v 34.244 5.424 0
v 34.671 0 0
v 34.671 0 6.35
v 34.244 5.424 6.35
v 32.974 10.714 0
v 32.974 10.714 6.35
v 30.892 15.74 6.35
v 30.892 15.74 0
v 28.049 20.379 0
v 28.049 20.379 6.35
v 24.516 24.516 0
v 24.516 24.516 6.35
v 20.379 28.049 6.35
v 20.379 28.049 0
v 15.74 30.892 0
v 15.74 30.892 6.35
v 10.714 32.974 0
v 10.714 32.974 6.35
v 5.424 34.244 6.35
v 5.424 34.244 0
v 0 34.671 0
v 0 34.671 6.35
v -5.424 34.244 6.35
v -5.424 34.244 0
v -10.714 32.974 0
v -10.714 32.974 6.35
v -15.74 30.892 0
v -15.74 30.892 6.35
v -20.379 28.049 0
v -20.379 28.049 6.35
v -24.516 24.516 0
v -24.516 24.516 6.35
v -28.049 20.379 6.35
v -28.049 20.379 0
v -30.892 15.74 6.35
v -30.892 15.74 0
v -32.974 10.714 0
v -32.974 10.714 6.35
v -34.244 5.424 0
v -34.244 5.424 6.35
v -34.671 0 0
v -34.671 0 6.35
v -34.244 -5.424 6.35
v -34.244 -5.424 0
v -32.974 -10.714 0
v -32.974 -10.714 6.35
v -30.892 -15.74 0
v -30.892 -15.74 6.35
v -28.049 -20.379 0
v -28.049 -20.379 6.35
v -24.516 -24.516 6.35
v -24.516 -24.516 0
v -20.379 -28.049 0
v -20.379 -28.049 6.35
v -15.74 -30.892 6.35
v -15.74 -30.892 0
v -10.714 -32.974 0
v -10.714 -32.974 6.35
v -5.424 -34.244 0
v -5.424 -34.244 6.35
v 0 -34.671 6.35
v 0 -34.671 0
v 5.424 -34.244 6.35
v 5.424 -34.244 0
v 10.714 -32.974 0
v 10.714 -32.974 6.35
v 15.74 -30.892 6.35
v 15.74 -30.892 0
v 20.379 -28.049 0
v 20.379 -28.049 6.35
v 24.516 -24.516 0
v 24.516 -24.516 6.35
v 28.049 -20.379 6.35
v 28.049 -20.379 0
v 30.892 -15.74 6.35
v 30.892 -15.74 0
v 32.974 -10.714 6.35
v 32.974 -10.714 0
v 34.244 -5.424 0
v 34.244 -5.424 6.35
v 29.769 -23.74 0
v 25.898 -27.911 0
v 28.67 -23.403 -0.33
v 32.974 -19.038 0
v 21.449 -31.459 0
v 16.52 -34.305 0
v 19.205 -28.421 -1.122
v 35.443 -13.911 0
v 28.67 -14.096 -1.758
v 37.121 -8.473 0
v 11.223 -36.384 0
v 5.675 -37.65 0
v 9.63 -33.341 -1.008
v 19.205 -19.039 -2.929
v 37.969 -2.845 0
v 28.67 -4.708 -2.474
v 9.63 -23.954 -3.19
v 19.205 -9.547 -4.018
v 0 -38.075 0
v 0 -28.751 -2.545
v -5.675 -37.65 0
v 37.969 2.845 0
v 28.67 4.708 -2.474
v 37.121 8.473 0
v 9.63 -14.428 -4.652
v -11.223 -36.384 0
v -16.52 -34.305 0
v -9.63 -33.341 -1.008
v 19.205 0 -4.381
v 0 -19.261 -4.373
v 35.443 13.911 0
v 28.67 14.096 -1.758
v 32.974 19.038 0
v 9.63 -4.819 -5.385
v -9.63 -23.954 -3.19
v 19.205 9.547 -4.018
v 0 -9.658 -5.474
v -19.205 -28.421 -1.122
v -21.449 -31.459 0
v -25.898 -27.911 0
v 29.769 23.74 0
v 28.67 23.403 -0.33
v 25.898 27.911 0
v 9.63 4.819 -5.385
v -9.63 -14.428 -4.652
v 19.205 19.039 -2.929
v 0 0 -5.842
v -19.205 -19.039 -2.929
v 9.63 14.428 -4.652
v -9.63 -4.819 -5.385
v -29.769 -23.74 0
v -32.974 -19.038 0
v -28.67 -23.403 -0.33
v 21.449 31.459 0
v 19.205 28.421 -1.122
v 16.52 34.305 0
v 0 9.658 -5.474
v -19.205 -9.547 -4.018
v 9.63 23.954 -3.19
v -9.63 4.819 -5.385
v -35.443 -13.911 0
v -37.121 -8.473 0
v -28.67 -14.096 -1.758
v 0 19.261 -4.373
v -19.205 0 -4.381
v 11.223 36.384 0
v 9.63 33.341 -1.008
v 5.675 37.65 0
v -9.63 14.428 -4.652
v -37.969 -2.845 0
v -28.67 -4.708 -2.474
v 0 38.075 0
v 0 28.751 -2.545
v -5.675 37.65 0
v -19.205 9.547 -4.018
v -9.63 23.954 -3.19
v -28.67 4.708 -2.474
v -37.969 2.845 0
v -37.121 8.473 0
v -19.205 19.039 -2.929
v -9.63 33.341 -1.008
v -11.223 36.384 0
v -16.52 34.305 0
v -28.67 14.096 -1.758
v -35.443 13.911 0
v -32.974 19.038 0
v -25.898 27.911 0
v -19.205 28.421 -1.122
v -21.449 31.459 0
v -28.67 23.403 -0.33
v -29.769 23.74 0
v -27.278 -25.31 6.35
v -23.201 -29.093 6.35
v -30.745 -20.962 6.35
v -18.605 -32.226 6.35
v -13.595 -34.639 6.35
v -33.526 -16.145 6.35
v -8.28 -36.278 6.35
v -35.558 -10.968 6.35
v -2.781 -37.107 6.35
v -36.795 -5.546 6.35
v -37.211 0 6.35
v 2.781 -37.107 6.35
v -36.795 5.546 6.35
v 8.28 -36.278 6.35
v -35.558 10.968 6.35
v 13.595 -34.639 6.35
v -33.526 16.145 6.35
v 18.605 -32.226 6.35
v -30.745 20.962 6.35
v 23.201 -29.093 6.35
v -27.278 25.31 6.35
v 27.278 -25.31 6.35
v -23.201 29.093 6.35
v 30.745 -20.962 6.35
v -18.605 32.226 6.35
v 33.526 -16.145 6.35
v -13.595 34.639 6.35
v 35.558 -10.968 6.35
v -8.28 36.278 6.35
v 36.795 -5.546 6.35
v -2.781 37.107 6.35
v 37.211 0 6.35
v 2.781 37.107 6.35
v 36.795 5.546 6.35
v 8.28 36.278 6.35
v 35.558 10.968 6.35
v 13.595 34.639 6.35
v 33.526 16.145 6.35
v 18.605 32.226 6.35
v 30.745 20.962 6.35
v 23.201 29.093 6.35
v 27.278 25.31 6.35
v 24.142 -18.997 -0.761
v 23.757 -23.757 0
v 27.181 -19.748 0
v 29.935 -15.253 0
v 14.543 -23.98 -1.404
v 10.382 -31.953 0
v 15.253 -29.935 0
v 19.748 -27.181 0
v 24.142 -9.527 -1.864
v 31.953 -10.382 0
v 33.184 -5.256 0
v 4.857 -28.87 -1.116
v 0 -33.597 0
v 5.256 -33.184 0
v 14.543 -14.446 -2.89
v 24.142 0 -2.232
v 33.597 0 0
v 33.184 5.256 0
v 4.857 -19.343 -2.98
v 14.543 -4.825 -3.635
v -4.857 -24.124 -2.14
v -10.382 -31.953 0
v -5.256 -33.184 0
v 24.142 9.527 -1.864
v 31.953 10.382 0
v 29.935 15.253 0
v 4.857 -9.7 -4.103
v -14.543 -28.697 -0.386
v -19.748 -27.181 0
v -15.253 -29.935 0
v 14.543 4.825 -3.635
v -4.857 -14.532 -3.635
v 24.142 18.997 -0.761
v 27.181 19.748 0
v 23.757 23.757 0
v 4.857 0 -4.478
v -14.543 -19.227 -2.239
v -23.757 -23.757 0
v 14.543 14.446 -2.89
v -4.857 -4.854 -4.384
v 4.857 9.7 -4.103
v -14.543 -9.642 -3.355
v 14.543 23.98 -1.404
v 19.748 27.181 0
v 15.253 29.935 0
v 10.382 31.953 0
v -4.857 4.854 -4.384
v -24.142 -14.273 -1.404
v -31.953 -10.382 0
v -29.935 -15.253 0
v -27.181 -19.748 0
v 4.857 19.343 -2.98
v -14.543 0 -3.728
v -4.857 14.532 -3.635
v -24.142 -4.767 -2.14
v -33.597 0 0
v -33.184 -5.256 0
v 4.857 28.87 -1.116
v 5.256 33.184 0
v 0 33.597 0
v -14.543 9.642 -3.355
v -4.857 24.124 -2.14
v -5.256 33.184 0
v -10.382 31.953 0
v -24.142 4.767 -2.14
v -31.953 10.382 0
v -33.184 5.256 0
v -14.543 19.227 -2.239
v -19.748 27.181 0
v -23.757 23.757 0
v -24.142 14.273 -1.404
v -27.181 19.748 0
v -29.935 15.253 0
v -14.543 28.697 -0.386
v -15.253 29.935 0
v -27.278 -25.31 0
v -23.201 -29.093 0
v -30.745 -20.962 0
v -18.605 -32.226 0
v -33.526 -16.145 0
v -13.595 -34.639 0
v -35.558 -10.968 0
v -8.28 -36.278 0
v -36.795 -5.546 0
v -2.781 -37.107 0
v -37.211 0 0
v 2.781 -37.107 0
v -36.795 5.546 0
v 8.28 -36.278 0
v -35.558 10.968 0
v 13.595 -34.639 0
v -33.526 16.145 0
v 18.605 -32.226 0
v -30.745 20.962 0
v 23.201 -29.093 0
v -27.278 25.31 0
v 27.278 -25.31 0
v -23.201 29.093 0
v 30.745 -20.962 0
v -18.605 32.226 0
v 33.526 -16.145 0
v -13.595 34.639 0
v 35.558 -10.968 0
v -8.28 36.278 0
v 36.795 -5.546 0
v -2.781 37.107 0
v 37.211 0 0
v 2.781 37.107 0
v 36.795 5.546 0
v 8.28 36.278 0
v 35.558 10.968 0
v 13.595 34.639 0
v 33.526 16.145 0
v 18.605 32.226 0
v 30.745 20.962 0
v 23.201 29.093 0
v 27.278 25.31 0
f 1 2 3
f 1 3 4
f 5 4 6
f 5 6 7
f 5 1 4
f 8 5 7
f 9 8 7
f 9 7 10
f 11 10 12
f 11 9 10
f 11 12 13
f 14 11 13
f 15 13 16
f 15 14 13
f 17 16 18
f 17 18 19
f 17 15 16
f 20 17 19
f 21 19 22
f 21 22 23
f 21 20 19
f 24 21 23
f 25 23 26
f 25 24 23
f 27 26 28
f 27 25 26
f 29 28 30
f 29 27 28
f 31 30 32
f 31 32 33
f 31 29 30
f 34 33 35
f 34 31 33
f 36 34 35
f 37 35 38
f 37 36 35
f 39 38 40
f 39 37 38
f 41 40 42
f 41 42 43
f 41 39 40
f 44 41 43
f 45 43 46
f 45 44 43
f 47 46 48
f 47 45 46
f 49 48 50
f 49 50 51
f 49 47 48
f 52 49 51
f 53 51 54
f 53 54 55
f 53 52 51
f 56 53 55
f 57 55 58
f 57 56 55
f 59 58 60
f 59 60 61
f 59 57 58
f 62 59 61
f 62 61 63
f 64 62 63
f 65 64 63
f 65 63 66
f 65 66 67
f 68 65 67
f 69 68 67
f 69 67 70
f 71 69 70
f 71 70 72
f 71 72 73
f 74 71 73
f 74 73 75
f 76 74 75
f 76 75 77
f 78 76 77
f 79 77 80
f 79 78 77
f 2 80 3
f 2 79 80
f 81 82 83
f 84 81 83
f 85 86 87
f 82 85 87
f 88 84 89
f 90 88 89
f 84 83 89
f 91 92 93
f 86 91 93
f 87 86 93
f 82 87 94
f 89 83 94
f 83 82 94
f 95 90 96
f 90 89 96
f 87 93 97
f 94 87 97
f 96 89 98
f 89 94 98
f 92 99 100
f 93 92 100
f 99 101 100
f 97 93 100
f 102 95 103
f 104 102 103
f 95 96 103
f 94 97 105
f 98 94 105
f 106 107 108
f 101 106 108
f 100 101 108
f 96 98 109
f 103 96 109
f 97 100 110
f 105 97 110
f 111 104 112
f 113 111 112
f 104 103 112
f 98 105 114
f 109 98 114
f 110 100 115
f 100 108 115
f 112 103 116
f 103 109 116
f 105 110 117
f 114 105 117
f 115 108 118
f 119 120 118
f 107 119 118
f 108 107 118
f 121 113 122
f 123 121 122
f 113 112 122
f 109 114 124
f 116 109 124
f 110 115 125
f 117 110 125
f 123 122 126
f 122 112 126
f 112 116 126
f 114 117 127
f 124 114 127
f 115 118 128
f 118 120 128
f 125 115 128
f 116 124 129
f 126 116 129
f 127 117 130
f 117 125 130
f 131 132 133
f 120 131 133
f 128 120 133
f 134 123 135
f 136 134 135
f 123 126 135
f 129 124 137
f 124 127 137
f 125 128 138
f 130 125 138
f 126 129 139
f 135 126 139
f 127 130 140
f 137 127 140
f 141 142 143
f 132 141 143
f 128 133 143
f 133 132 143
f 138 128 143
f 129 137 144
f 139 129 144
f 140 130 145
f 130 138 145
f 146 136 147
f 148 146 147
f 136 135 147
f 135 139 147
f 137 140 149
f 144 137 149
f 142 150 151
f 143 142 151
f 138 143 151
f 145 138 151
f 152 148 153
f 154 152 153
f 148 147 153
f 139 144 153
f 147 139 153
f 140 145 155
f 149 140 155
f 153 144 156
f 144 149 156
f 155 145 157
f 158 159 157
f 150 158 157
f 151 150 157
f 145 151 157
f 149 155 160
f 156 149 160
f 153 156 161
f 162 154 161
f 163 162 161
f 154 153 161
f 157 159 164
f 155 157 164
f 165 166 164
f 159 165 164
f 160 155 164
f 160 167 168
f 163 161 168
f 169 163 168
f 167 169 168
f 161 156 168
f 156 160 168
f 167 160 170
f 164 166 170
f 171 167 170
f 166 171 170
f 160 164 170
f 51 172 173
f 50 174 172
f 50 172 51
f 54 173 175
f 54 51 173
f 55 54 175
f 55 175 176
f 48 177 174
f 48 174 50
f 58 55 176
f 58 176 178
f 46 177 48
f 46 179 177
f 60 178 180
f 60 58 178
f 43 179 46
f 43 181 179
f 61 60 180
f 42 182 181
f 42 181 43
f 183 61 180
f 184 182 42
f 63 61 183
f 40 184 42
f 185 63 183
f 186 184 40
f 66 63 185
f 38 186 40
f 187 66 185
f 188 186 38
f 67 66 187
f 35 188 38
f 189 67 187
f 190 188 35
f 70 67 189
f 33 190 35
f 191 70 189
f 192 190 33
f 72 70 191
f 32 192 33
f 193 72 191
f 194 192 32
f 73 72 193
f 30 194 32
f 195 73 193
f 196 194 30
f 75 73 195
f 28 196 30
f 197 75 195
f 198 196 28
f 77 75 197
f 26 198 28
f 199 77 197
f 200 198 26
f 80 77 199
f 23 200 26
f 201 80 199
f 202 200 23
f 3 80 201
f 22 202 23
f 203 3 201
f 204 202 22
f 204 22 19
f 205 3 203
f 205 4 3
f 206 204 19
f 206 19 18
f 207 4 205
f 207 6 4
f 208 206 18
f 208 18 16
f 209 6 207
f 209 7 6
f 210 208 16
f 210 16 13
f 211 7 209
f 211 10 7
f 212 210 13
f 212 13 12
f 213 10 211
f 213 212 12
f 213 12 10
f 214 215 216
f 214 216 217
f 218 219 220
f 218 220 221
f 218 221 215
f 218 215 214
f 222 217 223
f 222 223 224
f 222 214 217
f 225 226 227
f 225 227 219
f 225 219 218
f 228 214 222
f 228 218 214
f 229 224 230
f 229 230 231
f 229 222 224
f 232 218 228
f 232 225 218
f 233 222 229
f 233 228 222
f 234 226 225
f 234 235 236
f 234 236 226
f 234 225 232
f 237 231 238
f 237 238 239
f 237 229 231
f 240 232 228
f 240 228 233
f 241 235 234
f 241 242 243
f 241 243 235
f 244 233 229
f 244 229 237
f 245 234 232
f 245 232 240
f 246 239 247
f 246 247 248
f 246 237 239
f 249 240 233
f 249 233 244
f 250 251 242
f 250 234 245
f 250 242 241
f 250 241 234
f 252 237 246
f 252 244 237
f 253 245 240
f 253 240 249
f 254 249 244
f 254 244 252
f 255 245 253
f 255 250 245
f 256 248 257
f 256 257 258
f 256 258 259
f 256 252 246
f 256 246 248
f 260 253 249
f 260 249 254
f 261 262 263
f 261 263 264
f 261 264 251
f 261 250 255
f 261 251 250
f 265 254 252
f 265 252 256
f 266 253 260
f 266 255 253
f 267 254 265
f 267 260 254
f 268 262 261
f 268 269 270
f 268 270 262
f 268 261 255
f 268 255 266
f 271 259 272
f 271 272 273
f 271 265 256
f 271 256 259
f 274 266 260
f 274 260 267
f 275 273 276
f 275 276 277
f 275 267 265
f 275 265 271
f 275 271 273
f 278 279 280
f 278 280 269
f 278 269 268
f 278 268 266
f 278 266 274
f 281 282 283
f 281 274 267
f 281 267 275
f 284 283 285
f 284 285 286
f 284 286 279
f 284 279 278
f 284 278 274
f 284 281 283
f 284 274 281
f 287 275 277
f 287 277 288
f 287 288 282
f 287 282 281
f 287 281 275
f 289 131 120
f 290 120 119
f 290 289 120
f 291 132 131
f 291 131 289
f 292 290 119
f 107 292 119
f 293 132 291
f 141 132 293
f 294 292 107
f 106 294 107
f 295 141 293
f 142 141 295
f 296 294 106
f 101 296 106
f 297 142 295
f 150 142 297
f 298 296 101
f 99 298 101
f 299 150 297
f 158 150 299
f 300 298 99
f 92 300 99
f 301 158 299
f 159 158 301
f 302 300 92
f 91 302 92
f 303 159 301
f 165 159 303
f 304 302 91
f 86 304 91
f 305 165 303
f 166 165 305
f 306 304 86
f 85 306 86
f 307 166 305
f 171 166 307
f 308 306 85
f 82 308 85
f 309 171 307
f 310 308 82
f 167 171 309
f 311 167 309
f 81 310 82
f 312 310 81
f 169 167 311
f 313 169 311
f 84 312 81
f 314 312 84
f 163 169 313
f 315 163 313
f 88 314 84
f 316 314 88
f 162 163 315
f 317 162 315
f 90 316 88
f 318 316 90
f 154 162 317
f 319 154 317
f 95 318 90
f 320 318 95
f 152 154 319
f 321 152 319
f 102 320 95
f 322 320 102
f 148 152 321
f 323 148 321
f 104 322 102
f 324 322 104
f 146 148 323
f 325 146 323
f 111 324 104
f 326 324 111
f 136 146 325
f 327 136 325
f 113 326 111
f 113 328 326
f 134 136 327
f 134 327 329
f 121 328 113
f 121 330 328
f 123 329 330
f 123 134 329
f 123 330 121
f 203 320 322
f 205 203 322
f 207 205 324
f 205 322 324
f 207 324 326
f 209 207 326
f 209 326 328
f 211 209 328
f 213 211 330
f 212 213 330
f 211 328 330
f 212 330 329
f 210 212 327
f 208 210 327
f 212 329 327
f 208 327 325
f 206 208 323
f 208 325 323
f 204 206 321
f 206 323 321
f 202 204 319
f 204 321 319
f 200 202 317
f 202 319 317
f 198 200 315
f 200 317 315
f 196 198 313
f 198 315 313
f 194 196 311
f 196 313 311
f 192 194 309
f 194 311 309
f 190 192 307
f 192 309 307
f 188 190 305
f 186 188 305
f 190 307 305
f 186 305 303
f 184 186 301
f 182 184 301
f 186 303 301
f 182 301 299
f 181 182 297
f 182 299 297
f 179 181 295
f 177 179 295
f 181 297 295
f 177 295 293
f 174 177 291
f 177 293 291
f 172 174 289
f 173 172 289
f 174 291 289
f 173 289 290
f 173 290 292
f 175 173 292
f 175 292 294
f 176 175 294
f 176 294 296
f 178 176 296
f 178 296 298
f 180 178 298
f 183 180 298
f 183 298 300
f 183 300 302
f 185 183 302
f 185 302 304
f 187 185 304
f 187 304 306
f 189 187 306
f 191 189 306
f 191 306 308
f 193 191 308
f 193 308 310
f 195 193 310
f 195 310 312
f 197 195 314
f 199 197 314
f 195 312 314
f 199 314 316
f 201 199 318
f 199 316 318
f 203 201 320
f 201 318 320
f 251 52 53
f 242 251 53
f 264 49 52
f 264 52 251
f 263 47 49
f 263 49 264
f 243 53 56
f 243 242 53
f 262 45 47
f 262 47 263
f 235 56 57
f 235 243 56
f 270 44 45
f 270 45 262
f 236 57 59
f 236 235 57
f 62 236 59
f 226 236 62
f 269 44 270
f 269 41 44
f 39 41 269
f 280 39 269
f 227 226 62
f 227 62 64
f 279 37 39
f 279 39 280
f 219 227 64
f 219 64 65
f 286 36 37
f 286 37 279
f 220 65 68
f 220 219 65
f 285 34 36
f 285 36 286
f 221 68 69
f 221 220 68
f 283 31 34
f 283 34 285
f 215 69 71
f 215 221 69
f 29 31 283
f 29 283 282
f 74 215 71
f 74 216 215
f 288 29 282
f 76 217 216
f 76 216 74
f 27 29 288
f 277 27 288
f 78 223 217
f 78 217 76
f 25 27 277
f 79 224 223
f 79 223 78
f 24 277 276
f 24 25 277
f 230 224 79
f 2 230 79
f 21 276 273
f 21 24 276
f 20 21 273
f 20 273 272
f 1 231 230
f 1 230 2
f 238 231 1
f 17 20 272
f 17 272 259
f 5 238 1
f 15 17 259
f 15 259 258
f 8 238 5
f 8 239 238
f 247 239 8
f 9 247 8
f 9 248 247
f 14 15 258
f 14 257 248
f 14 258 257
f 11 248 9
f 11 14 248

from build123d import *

# Parameters (mm, degrees)
F3_T     = -1.27
F4_W     = 834.6531093121
F4_H     = 674.1969883442
F5_DEPTH = 508
F0_R     = 37.211
F0_R_2   = 34.671
F6_DEPTH = 6.35


with BuildPart() as f2:
    # F1 (on Front) → F2 (revolve)
    with BuildSketch(Plane.XZ):
        with BuildLine():
            ThreePointArc((127, 121.158), (0, 248.158), (-127, 121.158))
            Line((-127, 121.158), (127, 121.158))
        make_face()
    revolve(axis=Axis((0, 0, 121.158), (1, 0, 0)))

    # F3 (hollow: no face is removed)
    offset(amount=F3_T, mode=Mode.SUBTRACT)

    # F4 (on Top) → F5 (cut)
    with BuildSketch(Plane.XY):
        with Locations((43.5875803232, -34.0506881475)):
            Rectangle(F4_W, F4_H)
    extrude(amount=F5_DEPTH, mode=Mode.SUBTRACT)

    # F0 (on Top) → F6 (join)
    with BuildSketch(Plane.XY):
        Circle(F0_R)
        Circle(F0_R_2, mode=Mode.SUBTRACT)
    extrude(amount=F6_DEPTH)


solid = f2.part
